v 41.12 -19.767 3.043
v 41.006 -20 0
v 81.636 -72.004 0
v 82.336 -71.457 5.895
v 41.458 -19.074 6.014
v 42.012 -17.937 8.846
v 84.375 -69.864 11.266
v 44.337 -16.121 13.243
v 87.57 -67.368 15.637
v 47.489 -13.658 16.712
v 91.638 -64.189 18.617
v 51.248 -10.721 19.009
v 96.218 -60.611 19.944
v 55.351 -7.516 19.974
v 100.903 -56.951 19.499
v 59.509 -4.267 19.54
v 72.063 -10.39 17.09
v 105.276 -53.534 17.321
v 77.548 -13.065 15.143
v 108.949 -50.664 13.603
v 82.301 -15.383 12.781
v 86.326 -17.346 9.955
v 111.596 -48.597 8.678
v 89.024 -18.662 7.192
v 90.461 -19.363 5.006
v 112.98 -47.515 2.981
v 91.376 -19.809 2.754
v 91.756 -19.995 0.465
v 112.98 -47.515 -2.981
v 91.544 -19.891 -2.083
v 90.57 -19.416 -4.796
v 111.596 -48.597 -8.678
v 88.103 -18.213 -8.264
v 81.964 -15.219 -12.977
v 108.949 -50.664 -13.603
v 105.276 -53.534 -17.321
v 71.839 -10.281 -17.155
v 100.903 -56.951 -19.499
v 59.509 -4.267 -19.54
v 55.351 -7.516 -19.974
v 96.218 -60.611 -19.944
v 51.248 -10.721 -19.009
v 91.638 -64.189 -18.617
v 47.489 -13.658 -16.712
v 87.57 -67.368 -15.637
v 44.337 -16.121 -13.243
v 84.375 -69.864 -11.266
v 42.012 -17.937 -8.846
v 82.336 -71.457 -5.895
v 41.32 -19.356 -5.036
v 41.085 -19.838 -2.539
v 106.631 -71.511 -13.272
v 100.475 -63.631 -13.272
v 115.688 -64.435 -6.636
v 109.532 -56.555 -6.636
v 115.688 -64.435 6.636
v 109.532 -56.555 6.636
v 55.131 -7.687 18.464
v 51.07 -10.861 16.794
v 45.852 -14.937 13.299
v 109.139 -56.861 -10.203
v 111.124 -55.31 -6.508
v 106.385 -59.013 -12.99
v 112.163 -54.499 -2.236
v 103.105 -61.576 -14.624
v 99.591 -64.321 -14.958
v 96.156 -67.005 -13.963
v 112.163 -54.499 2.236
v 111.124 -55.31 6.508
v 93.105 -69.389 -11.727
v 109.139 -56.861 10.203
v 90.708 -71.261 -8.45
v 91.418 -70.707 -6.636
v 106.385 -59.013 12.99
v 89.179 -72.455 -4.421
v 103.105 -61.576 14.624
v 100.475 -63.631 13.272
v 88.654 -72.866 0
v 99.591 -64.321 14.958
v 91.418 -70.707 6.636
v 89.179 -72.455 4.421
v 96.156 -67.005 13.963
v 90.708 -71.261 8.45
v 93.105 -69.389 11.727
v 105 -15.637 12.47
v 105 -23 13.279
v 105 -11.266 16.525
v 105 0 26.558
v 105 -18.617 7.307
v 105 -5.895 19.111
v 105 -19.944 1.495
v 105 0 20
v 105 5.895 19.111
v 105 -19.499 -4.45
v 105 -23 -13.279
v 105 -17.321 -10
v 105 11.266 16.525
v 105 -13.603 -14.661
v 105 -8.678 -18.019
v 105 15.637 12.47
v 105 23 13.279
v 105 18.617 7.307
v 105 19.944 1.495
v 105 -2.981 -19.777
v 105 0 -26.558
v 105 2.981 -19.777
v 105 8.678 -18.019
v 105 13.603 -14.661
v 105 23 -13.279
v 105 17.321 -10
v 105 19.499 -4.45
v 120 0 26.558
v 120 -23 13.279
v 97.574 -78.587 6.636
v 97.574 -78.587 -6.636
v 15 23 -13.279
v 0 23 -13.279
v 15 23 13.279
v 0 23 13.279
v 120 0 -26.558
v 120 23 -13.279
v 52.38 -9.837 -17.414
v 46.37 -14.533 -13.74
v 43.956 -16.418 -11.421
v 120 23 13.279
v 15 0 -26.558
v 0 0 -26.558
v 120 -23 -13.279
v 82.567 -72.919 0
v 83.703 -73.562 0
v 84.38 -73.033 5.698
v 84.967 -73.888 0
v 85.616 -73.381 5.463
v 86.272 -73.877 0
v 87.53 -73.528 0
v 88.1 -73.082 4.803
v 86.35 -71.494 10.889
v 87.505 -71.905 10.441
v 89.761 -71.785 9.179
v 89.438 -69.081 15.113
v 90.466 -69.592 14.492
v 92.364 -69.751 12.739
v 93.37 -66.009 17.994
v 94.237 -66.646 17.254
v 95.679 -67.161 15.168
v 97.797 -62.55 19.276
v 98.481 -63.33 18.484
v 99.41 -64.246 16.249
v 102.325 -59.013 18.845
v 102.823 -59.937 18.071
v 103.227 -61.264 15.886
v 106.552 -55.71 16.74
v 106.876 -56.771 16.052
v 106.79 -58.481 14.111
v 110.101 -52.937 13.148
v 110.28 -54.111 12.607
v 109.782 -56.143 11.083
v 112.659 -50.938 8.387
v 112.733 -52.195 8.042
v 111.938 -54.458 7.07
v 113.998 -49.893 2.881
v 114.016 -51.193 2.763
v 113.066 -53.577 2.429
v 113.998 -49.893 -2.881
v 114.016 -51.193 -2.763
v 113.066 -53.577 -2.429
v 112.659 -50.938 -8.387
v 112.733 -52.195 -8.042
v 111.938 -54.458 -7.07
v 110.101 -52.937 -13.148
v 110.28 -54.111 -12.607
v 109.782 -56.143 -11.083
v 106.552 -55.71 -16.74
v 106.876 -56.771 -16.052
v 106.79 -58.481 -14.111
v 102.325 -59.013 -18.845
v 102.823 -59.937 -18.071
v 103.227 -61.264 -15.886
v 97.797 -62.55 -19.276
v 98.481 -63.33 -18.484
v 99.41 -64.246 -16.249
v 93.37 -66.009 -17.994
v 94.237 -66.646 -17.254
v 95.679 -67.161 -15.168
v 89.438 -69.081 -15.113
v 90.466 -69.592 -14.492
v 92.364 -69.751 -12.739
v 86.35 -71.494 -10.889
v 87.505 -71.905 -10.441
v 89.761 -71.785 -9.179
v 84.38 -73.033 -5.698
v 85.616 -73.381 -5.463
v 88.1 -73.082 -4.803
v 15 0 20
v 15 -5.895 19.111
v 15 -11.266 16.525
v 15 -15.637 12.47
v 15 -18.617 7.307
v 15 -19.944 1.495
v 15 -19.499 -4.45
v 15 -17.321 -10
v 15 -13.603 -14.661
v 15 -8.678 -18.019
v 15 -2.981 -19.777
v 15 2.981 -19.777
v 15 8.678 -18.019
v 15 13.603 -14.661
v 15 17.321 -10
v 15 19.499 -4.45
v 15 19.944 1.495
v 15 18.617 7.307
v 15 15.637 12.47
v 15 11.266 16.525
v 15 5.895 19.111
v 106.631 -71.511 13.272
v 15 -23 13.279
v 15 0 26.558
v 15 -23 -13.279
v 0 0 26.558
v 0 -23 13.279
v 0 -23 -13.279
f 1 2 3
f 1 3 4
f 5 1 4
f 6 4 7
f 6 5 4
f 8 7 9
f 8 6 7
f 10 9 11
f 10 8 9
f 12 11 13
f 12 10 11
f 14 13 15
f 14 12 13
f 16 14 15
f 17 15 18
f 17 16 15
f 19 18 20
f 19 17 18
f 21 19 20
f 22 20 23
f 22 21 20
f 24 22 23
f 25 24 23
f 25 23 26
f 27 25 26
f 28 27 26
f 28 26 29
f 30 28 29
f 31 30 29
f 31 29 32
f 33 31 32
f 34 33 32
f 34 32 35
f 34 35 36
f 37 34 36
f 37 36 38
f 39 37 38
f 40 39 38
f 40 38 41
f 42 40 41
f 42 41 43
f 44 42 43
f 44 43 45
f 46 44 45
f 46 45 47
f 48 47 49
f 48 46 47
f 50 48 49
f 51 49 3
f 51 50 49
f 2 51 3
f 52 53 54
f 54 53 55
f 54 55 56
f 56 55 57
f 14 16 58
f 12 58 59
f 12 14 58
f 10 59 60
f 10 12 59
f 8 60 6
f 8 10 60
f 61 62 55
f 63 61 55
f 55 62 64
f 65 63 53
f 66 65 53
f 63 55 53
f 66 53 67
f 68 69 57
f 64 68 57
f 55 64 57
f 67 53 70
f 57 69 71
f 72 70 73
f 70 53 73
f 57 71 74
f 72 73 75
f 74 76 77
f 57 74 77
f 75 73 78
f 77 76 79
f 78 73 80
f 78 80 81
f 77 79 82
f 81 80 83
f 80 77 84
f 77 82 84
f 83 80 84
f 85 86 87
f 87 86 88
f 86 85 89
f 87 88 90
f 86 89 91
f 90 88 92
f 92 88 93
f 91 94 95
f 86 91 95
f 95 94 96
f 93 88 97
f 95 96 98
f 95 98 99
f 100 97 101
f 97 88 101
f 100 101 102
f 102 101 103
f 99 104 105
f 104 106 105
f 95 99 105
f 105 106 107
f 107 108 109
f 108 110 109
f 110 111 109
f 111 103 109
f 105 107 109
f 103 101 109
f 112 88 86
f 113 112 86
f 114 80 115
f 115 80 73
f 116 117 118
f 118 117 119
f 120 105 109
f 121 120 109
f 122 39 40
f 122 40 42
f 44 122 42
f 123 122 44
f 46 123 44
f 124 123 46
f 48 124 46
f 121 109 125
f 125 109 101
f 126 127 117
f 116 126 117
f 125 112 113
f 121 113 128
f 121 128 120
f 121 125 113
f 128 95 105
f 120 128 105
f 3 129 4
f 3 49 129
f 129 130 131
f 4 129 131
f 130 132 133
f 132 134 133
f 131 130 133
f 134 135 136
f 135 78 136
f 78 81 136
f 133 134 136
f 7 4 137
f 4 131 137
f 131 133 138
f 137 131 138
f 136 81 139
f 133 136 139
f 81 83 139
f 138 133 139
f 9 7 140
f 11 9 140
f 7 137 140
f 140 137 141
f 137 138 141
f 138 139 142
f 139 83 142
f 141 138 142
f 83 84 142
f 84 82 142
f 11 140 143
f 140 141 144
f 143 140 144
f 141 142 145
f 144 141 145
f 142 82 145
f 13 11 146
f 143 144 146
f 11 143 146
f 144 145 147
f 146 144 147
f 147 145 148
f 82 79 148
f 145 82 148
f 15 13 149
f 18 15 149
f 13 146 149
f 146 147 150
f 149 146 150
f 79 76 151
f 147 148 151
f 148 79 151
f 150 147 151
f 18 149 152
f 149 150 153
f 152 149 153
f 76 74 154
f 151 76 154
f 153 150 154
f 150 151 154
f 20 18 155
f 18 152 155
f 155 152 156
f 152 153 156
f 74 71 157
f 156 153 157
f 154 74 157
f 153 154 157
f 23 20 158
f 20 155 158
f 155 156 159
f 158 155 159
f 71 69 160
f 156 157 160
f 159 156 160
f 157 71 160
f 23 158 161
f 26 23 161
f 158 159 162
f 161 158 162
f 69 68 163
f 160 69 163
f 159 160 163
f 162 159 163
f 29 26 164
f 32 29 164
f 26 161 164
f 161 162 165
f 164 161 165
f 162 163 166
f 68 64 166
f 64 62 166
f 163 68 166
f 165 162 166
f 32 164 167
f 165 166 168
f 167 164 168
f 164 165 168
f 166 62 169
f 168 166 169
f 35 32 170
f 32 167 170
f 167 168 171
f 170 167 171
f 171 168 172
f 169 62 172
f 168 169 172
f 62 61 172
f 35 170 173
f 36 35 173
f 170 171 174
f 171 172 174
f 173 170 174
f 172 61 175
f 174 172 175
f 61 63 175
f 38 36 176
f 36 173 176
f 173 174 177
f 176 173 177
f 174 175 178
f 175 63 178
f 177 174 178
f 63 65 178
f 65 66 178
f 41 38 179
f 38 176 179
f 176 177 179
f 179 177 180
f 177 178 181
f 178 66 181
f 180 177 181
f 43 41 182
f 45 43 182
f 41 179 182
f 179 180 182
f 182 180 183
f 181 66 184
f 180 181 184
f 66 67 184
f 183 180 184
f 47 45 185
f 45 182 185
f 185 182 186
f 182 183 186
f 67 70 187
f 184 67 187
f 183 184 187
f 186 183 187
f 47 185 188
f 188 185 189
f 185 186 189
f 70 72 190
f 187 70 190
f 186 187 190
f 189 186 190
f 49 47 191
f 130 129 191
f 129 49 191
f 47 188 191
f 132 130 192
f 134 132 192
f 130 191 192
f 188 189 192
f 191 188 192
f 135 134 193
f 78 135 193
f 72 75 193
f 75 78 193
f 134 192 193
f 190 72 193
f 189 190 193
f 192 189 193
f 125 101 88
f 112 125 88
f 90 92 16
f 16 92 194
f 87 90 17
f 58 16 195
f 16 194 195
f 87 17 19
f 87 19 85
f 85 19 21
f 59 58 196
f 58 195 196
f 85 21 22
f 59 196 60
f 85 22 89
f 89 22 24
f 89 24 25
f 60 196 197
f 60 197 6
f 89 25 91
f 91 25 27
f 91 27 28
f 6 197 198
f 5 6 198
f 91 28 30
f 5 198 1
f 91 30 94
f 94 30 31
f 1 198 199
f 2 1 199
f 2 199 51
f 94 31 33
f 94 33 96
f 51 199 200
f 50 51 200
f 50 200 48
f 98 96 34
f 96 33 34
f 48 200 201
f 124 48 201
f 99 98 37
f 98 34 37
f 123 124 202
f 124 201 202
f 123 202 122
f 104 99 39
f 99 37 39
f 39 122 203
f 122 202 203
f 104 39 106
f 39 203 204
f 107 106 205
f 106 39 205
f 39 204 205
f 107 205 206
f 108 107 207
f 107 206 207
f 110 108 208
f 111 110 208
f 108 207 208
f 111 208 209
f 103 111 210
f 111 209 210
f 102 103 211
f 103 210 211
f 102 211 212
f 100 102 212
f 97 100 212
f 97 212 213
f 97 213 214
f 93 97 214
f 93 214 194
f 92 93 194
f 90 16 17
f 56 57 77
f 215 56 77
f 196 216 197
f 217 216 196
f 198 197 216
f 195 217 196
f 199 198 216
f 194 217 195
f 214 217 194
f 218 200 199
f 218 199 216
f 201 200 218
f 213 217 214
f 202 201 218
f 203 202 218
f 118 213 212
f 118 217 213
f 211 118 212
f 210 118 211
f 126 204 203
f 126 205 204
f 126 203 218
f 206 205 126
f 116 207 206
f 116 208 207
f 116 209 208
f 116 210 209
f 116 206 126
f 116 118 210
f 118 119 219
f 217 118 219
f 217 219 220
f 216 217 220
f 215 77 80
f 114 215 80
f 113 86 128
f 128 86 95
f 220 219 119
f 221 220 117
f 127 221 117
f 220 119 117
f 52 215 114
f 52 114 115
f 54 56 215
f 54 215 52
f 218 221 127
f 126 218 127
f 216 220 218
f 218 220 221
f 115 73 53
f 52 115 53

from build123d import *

# Parameters (mm, degrees)
EXTRUDE_417_DEPTH = 15
SKETCH_2_R        = 20
EXTRUDE_1_DEPTH   = 90
EXTRUDE_2_DEPTH   = 15
SKETCH_6_R        = 20
EXTRUDE_5_DEPTH   = 72
EXTRUDE_6_DEPTH   = 10
FILLET_5_R        = 5


with BuildPart() as part:
    # Эскиз1 → Extrude 417 (new body)
    with BuildSketch(Plane(origin=(0, 0, 0), x_dir=(0, 0, -1), z_dir=(1, 0, 0))):
        Polygon((26.558112383, 0), (13.279056191, 23), (-13.279056191, 23), (-26.558112383, 0), (-13.279056191, -23), (13.279056191, -23), align=None)
    extrude(amount=EXTRUDE_417_DEPTH)

    # Эскиз2 → Бобышка-Вытянуть1 (add)
    with BuildSketch(Plane(origin=(15, 0, 0), x_dir=(0, 0, -1), z_dir=(1, 0, 0))):
        with Locations(Location((0, 0, 0), (0, 0, 180))):
            Circle(SKETCH_2_R)
    extrude(amount=EXTRUDE_1_DEPTH)

    # Эскиз3 → Бобышка-Вытянуть2 (add)
    with BuildSketch(Plane(origin=(105, 0, 0), x_dir=(0, 0, -1), z_dir=(1, 0, 0))):
        Polygon((26.558112383, 0), (13.279056191, 23), (-13.279056191, 23), (-26.558112383, 0), (-13.279056191, -23), (13.279056191, -23), align=None)
    extrude(amount=EXTRUDE_2_DEPTH)

    # Эскиз6 → Бобышка-Вытянуть5 (add)
    with BuildSketch(Plane(origin=(24.626459013, -31.520430144, 0), x_dir=(0, 0, 1), z_dir=(-0.6156614753256595, 0.7880107536067209, 0))):
        with Locations(Location((0, 40, 0), (0, 0, 270))):
            Circle(SKETCH_6_R)
    extrude(amount=-EXTRUDE_5_DEPTH)

    # Эскиз7 → Бобышка-Вытянуть6 (add)
    with BuildSketch(Plane(origin=(68.954085236, -88.257204404, 0), x_dir=(0, 0, -1), z_dir=(0.6156614753256596, -0.788010753606721, 0))):
        Polygon((6.635774784, 51.493499074), (-6.635774784, 51.493499074), (-13.271549568, 40), (-6.635774784, 28.506500926), (6.635774784, 28.506500926), (13.271549568, 40), align=None)
    extrude(amount=EXTRUDE_6_DEPTH)

    # Скругление5
    fillet_5_edges = [part.edges().sort_by_distance(p)[0] for p in [
        (116.234730453, -51.317515884, 0),
    ]]
    fillet(fillet_5_edges, radius=FILLET_5_R)


solid = part.part
